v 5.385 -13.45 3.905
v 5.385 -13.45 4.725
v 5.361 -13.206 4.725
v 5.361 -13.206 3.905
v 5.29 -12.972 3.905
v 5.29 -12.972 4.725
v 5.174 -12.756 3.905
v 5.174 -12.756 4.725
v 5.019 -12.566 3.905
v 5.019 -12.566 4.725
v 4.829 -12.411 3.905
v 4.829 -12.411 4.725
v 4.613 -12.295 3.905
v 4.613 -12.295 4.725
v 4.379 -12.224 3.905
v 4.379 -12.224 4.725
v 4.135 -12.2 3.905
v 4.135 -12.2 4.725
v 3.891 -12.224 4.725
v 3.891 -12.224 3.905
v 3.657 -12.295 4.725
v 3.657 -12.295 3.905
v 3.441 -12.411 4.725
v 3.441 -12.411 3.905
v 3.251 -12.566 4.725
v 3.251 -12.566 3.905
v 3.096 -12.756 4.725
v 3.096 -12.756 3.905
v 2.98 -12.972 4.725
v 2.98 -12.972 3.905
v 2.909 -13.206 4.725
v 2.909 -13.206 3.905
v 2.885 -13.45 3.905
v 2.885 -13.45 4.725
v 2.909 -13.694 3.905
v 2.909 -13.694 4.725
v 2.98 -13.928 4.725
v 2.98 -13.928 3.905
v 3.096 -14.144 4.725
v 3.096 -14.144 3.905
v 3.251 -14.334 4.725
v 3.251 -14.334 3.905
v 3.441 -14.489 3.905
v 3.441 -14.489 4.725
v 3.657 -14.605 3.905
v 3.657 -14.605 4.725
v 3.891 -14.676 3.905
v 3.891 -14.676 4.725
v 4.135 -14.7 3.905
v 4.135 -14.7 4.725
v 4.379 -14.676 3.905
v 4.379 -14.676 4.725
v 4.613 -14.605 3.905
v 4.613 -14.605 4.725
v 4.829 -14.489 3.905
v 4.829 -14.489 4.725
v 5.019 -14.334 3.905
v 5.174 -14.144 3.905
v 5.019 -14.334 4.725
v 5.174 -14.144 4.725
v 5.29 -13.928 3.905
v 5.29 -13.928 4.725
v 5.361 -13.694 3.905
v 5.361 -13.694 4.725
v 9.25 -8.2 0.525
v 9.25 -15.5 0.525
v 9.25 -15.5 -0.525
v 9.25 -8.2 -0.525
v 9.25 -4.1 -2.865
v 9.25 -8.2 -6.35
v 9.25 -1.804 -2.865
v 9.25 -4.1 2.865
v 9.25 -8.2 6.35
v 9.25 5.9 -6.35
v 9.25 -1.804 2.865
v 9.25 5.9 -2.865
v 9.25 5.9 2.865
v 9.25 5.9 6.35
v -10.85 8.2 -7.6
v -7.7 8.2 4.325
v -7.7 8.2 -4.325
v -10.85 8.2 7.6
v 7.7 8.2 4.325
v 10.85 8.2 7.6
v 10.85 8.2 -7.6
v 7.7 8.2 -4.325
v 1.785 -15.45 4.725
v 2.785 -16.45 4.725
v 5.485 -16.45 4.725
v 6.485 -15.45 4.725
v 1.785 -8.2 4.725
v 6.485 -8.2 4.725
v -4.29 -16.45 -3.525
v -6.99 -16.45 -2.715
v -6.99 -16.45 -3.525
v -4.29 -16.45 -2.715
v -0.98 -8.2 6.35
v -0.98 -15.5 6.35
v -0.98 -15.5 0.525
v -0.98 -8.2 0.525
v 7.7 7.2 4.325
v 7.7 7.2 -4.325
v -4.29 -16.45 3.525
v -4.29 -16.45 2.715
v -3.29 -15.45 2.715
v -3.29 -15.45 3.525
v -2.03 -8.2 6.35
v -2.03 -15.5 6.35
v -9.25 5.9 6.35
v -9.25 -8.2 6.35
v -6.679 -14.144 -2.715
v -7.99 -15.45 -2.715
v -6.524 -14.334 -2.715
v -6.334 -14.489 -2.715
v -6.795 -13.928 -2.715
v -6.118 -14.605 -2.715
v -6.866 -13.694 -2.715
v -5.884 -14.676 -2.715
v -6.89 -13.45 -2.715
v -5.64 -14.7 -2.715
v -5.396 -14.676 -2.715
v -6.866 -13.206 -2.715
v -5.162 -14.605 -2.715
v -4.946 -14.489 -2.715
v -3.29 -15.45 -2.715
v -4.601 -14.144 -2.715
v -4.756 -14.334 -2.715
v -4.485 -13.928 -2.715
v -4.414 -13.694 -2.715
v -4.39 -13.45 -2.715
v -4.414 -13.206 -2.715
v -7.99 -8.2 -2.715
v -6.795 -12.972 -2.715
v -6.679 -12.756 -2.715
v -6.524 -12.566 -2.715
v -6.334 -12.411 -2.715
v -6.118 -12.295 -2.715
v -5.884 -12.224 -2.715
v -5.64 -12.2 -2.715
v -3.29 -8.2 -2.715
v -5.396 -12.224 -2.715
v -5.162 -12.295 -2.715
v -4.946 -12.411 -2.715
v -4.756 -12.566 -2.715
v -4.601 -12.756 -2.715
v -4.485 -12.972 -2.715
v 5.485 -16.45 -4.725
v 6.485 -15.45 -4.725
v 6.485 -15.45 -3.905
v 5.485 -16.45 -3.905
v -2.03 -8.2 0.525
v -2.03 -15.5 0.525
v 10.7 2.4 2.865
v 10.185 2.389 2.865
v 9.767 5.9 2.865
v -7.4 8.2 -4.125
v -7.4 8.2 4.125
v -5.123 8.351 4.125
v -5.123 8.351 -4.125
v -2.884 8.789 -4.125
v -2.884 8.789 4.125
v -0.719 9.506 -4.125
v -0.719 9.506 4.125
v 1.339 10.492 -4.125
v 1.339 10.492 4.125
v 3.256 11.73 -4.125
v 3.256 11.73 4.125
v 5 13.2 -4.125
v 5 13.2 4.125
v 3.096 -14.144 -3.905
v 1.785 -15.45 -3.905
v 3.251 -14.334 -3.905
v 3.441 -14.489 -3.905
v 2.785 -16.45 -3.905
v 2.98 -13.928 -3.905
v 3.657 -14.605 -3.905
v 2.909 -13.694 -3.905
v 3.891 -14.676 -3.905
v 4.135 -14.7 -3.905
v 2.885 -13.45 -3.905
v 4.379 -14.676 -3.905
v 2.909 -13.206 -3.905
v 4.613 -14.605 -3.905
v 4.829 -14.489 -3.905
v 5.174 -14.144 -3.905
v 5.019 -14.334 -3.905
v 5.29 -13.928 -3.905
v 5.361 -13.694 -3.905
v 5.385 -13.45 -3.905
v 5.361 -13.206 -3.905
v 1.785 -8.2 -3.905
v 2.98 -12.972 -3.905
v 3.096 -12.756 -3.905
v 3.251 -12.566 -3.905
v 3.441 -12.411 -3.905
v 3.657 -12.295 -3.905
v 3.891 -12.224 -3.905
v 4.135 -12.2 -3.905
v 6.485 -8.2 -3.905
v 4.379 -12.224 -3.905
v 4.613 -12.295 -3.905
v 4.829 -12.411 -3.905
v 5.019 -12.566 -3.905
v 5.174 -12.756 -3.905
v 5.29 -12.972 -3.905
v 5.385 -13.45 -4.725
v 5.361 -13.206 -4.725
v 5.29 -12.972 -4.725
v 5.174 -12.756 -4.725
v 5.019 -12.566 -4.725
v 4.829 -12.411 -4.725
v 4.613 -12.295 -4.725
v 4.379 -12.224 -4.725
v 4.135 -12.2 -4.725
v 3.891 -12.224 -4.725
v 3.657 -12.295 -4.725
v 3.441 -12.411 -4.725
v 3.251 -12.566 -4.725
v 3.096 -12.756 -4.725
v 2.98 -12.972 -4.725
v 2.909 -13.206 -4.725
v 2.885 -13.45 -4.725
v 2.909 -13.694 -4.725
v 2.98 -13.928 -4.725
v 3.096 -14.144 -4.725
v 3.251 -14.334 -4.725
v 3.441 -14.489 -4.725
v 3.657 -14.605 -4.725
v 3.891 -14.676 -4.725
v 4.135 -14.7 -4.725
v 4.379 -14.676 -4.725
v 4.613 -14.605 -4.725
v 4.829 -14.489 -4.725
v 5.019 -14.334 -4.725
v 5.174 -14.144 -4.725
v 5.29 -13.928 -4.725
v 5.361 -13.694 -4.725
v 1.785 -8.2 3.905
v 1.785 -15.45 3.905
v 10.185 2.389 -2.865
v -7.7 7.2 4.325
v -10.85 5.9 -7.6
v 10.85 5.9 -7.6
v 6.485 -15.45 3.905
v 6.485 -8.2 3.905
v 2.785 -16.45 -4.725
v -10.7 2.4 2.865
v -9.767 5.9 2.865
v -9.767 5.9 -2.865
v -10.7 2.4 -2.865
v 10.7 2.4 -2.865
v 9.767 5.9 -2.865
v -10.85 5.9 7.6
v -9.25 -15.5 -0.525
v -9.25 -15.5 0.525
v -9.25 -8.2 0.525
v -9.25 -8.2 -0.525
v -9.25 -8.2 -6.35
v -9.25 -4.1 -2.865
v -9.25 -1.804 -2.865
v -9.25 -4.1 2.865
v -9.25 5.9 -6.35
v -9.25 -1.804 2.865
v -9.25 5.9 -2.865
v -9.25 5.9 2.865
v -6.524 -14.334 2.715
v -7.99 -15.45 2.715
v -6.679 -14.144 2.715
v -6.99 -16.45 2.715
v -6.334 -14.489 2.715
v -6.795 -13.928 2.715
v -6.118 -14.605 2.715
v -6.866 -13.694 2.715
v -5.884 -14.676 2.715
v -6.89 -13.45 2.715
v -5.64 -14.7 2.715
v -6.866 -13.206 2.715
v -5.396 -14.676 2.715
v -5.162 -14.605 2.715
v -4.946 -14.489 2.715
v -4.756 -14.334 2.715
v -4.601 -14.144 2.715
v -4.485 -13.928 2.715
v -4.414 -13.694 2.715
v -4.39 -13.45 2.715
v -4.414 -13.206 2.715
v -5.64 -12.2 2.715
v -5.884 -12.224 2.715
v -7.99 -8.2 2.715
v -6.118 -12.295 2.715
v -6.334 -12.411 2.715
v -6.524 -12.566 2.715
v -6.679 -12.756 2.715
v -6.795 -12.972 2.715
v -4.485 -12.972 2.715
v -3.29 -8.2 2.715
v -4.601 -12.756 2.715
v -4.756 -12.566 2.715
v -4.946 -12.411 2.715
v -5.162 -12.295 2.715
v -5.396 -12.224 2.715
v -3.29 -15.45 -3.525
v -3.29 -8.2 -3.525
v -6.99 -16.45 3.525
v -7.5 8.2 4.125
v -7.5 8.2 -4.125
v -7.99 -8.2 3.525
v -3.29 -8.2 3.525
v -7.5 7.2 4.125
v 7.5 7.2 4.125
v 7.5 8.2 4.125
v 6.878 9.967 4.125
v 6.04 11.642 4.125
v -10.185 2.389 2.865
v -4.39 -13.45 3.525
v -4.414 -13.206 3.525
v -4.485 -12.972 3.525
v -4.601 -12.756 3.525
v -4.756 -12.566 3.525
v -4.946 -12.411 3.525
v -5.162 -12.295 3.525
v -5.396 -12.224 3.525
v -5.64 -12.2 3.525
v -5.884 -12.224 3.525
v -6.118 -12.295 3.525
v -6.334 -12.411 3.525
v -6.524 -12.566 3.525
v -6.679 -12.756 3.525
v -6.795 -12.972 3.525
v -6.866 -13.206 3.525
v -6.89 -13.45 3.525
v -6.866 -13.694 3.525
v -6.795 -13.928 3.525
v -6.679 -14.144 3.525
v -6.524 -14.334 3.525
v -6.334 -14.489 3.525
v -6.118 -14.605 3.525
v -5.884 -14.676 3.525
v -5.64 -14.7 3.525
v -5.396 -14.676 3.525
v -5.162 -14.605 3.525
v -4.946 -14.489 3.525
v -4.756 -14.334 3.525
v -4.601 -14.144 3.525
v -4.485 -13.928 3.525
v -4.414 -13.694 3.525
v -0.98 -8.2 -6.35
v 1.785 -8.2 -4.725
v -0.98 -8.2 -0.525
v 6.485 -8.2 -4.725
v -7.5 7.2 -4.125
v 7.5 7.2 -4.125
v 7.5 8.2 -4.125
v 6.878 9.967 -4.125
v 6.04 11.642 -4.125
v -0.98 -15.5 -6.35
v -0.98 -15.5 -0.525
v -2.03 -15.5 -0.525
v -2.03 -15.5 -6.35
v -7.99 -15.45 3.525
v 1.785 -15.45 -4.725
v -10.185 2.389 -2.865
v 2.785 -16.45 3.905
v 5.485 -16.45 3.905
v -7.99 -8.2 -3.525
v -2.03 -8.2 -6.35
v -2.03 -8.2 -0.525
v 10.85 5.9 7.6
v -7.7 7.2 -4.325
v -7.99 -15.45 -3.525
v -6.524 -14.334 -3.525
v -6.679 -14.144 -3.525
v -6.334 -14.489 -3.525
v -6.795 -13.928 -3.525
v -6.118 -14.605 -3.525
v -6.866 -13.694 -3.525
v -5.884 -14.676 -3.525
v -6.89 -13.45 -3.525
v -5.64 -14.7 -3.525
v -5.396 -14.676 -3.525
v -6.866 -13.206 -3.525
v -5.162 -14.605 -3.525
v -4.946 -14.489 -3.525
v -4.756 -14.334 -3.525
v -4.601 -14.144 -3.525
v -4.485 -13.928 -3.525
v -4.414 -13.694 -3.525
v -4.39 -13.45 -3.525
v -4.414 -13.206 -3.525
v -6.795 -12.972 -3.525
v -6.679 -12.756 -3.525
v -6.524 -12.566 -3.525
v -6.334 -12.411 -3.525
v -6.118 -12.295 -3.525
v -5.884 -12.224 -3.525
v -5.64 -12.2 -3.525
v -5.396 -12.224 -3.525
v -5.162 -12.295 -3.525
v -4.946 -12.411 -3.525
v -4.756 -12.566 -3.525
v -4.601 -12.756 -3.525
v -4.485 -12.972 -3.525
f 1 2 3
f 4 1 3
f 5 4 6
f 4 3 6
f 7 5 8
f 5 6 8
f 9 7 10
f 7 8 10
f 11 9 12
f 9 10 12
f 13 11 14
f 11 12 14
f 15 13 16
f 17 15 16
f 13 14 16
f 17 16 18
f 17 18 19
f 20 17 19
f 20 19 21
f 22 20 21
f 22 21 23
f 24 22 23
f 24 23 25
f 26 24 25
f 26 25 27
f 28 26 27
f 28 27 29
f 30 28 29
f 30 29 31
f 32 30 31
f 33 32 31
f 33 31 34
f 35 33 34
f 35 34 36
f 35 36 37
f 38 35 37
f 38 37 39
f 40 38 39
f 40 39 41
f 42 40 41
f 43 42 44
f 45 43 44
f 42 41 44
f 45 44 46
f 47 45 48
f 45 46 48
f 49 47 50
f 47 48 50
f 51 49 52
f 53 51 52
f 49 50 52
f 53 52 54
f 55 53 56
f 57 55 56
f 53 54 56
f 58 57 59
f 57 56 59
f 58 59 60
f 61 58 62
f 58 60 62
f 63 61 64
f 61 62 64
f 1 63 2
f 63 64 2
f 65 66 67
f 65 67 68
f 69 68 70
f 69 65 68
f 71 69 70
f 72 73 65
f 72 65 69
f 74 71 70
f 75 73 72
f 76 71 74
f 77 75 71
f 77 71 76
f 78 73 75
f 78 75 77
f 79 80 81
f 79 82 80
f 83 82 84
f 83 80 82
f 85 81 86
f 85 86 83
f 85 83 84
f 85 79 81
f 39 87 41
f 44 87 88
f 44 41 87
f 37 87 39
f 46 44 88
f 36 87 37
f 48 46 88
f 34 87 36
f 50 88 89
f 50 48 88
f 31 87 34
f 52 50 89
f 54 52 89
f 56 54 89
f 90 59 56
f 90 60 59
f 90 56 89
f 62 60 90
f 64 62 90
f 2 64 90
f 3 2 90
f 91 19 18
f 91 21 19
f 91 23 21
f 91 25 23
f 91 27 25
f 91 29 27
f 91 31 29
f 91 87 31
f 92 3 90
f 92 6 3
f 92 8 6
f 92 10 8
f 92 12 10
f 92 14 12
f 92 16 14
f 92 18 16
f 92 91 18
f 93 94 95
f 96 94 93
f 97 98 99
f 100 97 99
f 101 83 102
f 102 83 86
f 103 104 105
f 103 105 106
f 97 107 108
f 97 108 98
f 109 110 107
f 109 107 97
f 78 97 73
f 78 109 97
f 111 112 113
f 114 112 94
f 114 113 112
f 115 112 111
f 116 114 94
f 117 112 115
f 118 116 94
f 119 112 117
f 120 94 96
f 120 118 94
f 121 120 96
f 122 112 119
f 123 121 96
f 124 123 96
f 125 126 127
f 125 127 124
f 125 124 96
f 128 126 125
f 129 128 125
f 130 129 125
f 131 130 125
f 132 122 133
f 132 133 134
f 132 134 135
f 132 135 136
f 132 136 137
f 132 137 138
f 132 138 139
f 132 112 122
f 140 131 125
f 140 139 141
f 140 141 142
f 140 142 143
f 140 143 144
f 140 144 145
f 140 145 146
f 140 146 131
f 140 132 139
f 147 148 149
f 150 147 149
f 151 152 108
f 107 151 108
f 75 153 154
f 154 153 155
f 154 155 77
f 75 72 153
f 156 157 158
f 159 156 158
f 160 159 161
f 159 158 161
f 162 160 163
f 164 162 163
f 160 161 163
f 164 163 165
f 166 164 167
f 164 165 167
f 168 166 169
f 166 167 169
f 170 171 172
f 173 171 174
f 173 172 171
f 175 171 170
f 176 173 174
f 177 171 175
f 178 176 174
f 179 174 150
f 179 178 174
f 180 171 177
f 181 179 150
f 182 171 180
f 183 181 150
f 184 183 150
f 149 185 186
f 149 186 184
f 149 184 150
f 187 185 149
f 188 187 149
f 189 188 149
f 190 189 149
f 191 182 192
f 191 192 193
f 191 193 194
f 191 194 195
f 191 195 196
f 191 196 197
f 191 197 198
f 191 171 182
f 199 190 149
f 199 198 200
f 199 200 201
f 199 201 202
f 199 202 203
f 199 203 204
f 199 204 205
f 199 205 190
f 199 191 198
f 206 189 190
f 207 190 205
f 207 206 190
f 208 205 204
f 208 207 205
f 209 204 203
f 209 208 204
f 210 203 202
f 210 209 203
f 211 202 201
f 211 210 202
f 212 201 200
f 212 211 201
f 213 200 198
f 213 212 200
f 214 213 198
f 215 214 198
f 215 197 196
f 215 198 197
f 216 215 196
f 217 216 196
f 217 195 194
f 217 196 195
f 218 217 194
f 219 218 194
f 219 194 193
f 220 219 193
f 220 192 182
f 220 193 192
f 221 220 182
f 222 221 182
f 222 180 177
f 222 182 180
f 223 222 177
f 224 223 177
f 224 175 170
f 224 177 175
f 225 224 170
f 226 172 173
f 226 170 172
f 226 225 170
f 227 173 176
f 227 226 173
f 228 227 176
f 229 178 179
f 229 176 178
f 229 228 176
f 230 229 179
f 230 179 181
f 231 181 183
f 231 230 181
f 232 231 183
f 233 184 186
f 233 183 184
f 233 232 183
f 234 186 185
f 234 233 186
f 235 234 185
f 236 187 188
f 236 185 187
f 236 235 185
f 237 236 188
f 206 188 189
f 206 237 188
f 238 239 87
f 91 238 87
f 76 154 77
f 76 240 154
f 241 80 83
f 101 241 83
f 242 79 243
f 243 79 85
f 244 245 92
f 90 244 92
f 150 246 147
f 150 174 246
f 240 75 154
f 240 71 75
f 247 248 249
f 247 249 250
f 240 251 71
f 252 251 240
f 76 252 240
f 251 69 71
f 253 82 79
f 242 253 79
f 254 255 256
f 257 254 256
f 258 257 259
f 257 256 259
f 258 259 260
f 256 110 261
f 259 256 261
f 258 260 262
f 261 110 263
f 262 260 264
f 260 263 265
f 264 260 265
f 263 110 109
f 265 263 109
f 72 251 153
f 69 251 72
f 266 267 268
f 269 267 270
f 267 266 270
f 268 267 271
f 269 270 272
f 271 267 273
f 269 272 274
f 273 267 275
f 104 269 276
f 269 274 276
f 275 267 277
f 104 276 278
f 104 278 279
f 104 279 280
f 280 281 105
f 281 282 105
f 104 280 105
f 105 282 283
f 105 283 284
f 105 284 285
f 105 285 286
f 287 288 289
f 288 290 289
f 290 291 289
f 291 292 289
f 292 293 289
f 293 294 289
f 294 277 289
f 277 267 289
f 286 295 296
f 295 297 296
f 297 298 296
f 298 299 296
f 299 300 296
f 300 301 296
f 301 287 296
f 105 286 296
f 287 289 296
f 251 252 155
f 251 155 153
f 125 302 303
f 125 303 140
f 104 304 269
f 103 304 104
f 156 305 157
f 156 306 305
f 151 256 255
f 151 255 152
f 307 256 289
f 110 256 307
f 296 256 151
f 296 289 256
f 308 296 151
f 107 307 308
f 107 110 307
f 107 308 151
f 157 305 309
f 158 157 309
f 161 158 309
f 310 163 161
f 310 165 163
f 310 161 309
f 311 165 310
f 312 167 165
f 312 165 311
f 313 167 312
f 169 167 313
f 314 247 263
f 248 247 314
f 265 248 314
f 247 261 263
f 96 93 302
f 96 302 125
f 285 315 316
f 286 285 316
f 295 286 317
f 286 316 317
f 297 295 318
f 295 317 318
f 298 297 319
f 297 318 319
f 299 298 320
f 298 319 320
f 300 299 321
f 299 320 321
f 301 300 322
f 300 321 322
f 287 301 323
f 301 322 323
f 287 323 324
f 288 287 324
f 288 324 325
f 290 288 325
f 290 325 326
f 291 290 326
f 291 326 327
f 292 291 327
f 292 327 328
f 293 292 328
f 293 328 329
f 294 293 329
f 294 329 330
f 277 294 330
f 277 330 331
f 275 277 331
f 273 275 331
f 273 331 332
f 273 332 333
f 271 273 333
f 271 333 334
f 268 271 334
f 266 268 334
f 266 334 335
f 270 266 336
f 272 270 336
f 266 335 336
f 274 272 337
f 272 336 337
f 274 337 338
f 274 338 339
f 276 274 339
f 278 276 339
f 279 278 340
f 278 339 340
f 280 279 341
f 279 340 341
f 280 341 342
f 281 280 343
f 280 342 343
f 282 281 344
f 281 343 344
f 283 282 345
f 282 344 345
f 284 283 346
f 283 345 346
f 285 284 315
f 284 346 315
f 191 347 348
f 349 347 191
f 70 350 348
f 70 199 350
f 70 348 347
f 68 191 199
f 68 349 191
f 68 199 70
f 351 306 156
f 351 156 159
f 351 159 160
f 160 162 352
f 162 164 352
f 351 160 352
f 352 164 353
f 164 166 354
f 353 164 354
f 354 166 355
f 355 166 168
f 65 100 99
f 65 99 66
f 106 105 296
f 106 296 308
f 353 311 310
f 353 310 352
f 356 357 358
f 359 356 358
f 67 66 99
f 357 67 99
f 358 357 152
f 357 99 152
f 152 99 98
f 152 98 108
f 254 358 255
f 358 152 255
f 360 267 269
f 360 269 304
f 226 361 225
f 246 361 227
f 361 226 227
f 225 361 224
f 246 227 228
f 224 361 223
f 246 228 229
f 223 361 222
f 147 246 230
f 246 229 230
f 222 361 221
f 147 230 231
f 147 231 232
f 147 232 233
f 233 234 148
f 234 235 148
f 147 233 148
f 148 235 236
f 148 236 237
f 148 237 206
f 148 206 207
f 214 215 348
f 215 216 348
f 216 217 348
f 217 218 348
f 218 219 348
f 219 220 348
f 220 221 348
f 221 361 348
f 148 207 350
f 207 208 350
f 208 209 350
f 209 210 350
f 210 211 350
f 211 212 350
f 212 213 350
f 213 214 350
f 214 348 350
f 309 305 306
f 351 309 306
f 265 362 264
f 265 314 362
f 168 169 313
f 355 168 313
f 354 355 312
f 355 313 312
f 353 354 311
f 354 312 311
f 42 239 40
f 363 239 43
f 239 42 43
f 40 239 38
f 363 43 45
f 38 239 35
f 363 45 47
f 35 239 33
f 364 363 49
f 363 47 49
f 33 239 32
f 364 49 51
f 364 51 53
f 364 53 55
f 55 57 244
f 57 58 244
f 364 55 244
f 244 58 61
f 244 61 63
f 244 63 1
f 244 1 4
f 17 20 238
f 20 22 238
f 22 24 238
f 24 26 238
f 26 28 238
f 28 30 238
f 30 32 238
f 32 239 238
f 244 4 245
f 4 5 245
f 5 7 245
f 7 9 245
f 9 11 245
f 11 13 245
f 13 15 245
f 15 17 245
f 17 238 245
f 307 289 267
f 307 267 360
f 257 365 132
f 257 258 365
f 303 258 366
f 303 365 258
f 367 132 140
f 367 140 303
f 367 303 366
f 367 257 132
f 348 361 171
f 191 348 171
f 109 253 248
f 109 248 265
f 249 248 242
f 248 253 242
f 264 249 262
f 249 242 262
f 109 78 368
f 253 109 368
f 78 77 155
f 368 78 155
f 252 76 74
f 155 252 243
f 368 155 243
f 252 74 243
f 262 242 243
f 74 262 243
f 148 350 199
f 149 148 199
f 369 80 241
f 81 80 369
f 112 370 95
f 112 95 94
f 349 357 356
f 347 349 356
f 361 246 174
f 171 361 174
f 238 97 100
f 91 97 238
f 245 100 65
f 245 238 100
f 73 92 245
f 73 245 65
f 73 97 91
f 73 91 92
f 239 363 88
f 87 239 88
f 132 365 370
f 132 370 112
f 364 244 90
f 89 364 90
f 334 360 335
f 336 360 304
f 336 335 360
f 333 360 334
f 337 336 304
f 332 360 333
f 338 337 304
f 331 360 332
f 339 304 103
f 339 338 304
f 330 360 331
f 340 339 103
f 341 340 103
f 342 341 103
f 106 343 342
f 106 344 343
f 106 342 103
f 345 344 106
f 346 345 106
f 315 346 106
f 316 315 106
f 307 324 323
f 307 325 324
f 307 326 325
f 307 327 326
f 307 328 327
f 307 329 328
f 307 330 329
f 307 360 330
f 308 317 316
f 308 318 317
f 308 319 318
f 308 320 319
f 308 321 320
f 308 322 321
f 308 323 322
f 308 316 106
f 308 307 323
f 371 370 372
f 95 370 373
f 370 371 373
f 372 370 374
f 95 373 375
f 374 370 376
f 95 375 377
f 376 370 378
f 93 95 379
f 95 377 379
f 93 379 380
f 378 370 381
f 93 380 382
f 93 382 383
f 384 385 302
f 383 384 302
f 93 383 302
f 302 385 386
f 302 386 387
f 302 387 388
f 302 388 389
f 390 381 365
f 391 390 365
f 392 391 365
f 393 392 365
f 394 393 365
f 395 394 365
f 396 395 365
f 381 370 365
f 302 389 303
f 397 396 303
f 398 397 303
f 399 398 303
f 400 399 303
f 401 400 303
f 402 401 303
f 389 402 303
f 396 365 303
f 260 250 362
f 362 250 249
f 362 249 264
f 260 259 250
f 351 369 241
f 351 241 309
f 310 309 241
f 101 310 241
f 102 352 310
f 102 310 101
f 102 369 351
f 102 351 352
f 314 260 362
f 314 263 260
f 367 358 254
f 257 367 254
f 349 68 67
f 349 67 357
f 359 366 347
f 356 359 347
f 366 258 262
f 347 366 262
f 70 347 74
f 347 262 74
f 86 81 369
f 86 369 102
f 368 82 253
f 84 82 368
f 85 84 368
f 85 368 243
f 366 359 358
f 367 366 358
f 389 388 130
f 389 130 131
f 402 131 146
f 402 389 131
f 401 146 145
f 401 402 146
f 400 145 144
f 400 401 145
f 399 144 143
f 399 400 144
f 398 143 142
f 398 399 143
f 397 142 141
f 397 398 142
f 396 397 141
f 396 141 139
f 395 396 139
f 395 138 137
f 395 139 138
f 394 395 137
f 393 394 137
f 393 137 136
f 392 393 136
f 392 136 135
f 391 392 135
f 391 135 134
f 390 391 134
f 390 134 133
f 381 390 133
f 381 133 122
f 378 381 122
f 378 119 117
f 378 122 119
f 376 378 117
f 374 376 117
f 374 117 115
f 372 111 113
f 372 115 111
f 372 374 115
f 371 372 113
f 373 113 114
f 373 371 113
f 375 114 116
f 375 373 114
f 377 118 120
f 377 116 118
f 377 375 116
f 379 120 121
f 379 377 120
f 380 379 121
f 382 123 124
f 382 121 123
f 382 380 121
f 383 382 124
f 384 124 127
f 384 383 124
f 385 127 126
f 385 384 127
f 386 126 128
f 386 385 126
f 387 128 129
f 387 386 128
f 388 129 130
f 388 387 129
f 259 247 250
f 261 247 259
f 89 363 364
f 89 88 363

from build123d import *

# Parameters (mm, degrees)
SKETCH_1_W          = 18.5
SKETCH_1_H          = 16.4
EXTRUDE_1_DEPTH     = 6.35
SKETCH_2_W          = 21.7
SKETCH_2_H          = 15.2
EXTRUDE_2_DEPTH     = 2.3
EXTRUDE_3_DEPTH     = 2.865
EXTRUDE_4_DEPTH     = 7.3
SKETCH_5_W          = 4.7
SKETCH_5_H          = 0.81
SKETCH_5_H_2        = 0.82
EXTRUDE_5_DEPTH     = 8.25
CHAMFER_1_SIZE      = 1
SKETCH_6_R          = 1.25
CUT_EXTRUDE_1_DEPTH = 2.25
EXTRUDE_6_DEPTH     = 4.125
SKETCH_8_W          = 15.4
SKETCH_8_H          = 8.65
SKETCH_8_W_2        = 15
SKETCH_8_H_2        = 8.25
CUT_EXTRUDE_2_DEPTH = 1


with BuildPart() as part:
    # 草图1 → 凸台-拉伸1 (new body, symmetric)
    with BuildSketch(Plane.XY):
        Rectangle(SKETCH_1_W, SKETCH_1_H)
    extrude(amount=EXTRUDE_1_DEPTH, both=True)

    # 草图2 → 凸台-拉伸2 (add)
    with BuildSketch(Plane(origin=(0, 8.2, 0), x_dir=(1, 0, 0), z_dir=(0, 1, 0))):
        Rectangle(SKETCH_2_W, SKETCH_2_H)
    extrude(amount=-EXTRUDE_2_DEPTH)

    # 草图3 → 凸台-拉伸3 (add, symmetric)
    with BuildSketch(Plane.XY):
        Polygon((9.25, 5.9), (9.767443892, 5.9), (10.7, 2.4), (9.25, -4.1), (9.25, -1.80352853), (10.185361465, 2.389471142), align=None)
        Polygon((-10.185361465, 2.389471142), (-9.25, 5.9), (-9.767443892, 5.9), (-10.7, 2.4), (-9.25, -4.1), (-9.25, -1.80352853), align=None)
    extrude(amount=EXTRUDE_3_DEPTH, both=True)

    # 草图4 → 凸台-拉伸4 (add)
    with BuildSketch(Plane.XZ.offset(8.2)):
        Polygon((-9.25, 0.525), (-2.03, 0.525), (-2.03, 6.35), (-0.98, 6.35), (-0.98, 0.525), (9.25, 0.525), (9.25, -0.525), (-0.98, -0.525), (-0.98, -6.35), (-2.03, -6.35), (-2.03, -0.525), (-9.25, -0.525), align=None)
    extrude(amount=EXTRUDE_4_DEPTH)

    # 草图5 → 凸台-拉伸5 (add)
    with BuildSketch(Plane.XZ.offset(8.2)):
        with Locations((-5.64, 3.12)):
            Rectangle(SKETCH_5_W, SKETCH_5_H)
        with Locations((4.135, 4.315)):
            Rectangle(SKETCH_5_W, SKETCH_5_H_2)
        with Locations((4.135, -4.315)):
            Rectangle(SKETCH_5_W, SKETCH_5_H_2)
        with Locations((-5.64, -3.12)):
            Rectangle(SKETCH_5_W, SKETCH_5_H)
    extrude(amount=EXTRUDE_5_DEPTH)

    # 倒角1
    chamfer_1_edges = [part.edges().sort_by_distance(p)[0] for p in [
        (-3.29, -16.45, 3.12),
        (-7.99, -16.45, 3.12),
        (6.485, -16.45, 4.315),
        (1.785, -16.45, 4.315),
        (1.785, -16.45, -4.315),
        (6.485, -16.45, -4.315),
        (-7.99, -16.45, -3.12),
        (-3.29, -16.45, -3.12),
    ]]
    chamfer(chamfer_1_edges, length=CHAMFER_1_SIZE)

    # 草图6 → 切除-拉伸1 (cut)
    with BuildSketch(Plane.XY.offset(4.725)):
        with Locations((4.135, -13.45)):
            Circle(SKETCH_6_R)
        with Locations((-5.64, -13.45)):
            Circle(SKETCH_6_R)
    cut_extrude_1 = extrude(amount=-CUT_EXTRUDE_1_DEPTH, mode=Mode.SUBTRACT)

    # 镜向1: 切除-拉伸1 across plane
    add(cut_extrude_1.mirror(Plane.XY), mode=Mode.SUBTRACT)

    # 草图7 → 凸台-拉伸6 (add, symmetric)
    with BuildSketch(Plane.XY):
        with BuildLine():
            ThreePointArc((5, 13.2), (6.484981539, 10.817490769), (7.5, 8.2))
            Line((7.5, 8.2), (-7.5, 8.2))
            ThreePointArc((-7.5, 8.2), (-0.764940017, 9.487350042), (5, 13.2))
        make_face()
    extrude(amount=EXTRUDE_6_DEPTH, both=True)

    # 草图8 → 切除-拉伸2 (cut)
    with BuildSketch(Plane(origin=(0, 8.2, 0), x_dir=(1, 0, 0), z_dir=(0, 1, 0))):
        Rectangle(SKETCH_8_W, SKETCH_8_H)
        Rectangle(SKETCH_8_W_2, SKETCH_8_H_2, mode=Mode.SUBTRACT)
    extrude(amount=-CUT_EXTRUDE_2_DEPTH, mode=Mode.SUBTRACT)


solid = part.part
